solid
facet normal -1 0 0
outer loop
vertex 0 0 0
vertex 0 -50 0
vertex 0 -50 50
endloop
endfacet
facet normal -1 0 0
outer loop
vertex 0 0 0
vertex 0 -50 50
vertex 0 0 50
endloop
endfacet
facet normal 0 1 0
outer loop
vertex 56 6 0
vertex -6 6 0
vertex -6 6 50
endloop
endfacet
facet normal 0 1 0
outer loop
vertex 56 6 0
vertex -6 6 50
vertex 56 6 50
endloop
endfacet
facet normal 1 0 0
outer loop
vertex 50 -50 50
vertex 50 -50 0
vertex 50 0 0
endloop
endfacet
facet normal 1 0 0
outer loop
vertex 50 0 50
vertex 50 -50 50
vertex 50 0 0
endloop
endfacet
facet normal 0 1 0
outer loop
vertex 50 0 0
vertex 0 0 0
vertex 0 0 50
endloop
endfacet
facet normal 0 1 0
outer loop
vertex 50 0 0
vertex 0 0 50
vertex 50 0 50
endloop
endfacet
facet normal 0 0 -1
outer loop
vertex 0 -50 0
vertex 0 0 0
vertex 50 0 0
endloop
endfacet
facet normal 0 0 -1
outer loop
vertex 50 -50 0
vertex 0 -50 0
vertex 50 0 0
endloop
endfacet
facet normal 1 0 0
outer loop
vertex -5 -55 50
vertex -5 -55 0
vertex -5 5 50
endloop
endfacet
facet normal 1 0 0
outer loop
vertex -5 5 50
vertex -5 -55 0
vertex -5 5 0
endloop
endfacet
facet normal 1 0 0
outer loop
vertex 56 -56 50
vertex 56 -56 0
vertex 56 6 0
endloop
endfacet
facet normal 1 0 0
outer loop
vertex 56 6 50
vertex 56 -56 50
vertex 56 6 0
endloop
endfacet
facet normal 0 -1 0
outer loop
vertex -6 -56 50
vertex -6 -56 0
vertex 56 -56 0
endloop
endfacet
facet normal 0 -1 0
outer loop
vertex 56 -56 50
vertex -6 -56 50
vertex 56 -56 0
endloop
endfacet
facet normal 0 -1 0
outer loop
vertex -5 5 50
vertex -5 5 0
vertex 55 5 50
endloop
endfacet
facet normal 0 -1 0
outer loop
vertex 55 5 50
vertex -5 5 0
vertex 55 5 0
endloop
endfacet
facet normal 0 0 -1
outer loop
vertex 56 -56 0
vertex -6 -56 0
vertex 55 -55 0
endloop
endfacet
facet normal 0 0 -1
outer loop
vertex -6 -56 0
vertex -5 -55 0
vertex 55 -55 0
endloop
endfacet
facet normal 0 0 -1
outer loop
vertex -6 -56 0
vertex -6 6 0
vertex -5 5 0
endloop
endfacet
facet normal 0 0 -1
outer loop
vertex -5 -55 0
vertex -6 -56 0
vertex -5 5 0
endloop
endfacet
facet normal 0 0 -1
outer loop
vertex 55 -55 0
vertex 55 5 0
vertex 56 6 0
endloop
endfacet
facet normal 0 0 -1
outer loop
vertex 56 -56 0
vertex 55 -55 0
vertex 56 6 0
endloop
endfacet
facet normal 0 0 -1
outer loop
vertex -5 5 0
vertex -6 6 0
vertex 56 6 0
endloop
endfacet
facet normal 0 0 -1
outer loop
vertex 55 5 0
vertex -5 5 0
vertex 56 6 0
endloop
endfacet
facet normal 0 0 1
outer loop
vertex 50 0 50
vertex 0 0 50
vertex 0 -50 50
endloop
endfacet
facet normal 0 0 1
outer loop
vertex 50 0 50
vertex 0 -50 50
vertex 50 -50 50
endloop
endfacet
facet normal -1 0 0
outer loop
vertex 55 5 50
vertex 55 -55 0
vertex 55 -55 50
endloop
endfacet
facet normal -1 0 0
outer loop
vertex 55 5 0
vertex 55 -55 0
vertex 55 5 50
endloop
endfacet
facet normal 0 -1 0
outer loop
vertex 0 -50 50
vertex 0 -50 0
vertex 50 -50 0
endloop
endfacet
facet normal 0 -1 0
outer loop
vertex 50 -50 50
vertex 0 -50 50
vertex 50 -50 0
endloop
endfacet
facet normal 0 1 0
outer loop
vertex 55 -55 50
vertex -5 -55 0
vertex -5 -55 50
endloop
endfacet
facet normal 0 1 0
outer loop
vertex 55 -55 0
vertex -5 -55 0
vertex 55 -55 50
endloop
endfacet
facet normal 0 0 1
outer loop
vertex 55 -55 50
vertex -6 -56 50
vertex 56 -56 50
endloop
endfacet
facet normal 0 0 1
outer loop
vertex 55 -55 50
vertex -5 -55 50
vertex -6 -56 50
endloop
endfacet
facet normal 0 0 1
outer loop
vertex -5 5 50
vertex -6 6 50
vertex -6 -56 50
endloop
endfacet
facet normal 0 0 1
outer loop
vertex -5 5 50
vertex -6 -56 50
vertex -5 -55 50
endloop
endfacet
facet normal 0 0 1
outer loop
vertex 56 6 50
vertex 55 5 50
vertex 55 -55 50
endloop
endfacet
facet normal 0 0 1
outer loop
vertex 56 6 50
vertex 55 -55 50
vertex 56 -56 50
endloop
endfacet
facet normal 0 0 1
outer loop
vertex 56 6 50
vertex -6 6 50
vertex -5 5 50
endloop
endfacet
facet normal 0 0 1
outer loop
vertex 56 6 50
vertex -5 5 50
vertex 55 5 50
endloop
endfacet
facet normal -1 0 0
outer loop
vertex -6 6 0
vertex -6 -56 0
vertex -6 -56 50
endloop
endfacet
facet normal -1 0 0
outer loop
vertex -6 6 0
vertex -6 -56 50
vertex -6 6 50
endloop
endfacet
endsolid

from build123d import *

# Parameters (mm, degrees)
F0_W     = 50
F0_H     = 50
F1_DEPTH = 50
F0_W_2   = 62
F0_H_2   = 62
F0_W_3   = 60
F0_H_3   = 60
F2_DEPTH = 50


with BuildPart() as f1:
    # F0 (on Top) → F1 (new body)
    with BuildSketch(Plane.XY):
        with Locations((25, -25)):
            Rectangle(F0_W, F0_H)
    extrude(amount=F1_DEPTH)


with BuildPart() as f2:
    # F0 (on Top) → F2 (new body)
    with BuildSketch(Plane.XY):
        with Locations((25, -25)):
            Rectangle(F0_W_2, F0_H_2)
        with Locations((25, -25)):
            Rectangle(F0_W_3, F0_H_3, mode=Mode.SUBTRACT)
    extrude(amount=F2_DEPTH)


solid = Compound([f1.part, f2.part])
